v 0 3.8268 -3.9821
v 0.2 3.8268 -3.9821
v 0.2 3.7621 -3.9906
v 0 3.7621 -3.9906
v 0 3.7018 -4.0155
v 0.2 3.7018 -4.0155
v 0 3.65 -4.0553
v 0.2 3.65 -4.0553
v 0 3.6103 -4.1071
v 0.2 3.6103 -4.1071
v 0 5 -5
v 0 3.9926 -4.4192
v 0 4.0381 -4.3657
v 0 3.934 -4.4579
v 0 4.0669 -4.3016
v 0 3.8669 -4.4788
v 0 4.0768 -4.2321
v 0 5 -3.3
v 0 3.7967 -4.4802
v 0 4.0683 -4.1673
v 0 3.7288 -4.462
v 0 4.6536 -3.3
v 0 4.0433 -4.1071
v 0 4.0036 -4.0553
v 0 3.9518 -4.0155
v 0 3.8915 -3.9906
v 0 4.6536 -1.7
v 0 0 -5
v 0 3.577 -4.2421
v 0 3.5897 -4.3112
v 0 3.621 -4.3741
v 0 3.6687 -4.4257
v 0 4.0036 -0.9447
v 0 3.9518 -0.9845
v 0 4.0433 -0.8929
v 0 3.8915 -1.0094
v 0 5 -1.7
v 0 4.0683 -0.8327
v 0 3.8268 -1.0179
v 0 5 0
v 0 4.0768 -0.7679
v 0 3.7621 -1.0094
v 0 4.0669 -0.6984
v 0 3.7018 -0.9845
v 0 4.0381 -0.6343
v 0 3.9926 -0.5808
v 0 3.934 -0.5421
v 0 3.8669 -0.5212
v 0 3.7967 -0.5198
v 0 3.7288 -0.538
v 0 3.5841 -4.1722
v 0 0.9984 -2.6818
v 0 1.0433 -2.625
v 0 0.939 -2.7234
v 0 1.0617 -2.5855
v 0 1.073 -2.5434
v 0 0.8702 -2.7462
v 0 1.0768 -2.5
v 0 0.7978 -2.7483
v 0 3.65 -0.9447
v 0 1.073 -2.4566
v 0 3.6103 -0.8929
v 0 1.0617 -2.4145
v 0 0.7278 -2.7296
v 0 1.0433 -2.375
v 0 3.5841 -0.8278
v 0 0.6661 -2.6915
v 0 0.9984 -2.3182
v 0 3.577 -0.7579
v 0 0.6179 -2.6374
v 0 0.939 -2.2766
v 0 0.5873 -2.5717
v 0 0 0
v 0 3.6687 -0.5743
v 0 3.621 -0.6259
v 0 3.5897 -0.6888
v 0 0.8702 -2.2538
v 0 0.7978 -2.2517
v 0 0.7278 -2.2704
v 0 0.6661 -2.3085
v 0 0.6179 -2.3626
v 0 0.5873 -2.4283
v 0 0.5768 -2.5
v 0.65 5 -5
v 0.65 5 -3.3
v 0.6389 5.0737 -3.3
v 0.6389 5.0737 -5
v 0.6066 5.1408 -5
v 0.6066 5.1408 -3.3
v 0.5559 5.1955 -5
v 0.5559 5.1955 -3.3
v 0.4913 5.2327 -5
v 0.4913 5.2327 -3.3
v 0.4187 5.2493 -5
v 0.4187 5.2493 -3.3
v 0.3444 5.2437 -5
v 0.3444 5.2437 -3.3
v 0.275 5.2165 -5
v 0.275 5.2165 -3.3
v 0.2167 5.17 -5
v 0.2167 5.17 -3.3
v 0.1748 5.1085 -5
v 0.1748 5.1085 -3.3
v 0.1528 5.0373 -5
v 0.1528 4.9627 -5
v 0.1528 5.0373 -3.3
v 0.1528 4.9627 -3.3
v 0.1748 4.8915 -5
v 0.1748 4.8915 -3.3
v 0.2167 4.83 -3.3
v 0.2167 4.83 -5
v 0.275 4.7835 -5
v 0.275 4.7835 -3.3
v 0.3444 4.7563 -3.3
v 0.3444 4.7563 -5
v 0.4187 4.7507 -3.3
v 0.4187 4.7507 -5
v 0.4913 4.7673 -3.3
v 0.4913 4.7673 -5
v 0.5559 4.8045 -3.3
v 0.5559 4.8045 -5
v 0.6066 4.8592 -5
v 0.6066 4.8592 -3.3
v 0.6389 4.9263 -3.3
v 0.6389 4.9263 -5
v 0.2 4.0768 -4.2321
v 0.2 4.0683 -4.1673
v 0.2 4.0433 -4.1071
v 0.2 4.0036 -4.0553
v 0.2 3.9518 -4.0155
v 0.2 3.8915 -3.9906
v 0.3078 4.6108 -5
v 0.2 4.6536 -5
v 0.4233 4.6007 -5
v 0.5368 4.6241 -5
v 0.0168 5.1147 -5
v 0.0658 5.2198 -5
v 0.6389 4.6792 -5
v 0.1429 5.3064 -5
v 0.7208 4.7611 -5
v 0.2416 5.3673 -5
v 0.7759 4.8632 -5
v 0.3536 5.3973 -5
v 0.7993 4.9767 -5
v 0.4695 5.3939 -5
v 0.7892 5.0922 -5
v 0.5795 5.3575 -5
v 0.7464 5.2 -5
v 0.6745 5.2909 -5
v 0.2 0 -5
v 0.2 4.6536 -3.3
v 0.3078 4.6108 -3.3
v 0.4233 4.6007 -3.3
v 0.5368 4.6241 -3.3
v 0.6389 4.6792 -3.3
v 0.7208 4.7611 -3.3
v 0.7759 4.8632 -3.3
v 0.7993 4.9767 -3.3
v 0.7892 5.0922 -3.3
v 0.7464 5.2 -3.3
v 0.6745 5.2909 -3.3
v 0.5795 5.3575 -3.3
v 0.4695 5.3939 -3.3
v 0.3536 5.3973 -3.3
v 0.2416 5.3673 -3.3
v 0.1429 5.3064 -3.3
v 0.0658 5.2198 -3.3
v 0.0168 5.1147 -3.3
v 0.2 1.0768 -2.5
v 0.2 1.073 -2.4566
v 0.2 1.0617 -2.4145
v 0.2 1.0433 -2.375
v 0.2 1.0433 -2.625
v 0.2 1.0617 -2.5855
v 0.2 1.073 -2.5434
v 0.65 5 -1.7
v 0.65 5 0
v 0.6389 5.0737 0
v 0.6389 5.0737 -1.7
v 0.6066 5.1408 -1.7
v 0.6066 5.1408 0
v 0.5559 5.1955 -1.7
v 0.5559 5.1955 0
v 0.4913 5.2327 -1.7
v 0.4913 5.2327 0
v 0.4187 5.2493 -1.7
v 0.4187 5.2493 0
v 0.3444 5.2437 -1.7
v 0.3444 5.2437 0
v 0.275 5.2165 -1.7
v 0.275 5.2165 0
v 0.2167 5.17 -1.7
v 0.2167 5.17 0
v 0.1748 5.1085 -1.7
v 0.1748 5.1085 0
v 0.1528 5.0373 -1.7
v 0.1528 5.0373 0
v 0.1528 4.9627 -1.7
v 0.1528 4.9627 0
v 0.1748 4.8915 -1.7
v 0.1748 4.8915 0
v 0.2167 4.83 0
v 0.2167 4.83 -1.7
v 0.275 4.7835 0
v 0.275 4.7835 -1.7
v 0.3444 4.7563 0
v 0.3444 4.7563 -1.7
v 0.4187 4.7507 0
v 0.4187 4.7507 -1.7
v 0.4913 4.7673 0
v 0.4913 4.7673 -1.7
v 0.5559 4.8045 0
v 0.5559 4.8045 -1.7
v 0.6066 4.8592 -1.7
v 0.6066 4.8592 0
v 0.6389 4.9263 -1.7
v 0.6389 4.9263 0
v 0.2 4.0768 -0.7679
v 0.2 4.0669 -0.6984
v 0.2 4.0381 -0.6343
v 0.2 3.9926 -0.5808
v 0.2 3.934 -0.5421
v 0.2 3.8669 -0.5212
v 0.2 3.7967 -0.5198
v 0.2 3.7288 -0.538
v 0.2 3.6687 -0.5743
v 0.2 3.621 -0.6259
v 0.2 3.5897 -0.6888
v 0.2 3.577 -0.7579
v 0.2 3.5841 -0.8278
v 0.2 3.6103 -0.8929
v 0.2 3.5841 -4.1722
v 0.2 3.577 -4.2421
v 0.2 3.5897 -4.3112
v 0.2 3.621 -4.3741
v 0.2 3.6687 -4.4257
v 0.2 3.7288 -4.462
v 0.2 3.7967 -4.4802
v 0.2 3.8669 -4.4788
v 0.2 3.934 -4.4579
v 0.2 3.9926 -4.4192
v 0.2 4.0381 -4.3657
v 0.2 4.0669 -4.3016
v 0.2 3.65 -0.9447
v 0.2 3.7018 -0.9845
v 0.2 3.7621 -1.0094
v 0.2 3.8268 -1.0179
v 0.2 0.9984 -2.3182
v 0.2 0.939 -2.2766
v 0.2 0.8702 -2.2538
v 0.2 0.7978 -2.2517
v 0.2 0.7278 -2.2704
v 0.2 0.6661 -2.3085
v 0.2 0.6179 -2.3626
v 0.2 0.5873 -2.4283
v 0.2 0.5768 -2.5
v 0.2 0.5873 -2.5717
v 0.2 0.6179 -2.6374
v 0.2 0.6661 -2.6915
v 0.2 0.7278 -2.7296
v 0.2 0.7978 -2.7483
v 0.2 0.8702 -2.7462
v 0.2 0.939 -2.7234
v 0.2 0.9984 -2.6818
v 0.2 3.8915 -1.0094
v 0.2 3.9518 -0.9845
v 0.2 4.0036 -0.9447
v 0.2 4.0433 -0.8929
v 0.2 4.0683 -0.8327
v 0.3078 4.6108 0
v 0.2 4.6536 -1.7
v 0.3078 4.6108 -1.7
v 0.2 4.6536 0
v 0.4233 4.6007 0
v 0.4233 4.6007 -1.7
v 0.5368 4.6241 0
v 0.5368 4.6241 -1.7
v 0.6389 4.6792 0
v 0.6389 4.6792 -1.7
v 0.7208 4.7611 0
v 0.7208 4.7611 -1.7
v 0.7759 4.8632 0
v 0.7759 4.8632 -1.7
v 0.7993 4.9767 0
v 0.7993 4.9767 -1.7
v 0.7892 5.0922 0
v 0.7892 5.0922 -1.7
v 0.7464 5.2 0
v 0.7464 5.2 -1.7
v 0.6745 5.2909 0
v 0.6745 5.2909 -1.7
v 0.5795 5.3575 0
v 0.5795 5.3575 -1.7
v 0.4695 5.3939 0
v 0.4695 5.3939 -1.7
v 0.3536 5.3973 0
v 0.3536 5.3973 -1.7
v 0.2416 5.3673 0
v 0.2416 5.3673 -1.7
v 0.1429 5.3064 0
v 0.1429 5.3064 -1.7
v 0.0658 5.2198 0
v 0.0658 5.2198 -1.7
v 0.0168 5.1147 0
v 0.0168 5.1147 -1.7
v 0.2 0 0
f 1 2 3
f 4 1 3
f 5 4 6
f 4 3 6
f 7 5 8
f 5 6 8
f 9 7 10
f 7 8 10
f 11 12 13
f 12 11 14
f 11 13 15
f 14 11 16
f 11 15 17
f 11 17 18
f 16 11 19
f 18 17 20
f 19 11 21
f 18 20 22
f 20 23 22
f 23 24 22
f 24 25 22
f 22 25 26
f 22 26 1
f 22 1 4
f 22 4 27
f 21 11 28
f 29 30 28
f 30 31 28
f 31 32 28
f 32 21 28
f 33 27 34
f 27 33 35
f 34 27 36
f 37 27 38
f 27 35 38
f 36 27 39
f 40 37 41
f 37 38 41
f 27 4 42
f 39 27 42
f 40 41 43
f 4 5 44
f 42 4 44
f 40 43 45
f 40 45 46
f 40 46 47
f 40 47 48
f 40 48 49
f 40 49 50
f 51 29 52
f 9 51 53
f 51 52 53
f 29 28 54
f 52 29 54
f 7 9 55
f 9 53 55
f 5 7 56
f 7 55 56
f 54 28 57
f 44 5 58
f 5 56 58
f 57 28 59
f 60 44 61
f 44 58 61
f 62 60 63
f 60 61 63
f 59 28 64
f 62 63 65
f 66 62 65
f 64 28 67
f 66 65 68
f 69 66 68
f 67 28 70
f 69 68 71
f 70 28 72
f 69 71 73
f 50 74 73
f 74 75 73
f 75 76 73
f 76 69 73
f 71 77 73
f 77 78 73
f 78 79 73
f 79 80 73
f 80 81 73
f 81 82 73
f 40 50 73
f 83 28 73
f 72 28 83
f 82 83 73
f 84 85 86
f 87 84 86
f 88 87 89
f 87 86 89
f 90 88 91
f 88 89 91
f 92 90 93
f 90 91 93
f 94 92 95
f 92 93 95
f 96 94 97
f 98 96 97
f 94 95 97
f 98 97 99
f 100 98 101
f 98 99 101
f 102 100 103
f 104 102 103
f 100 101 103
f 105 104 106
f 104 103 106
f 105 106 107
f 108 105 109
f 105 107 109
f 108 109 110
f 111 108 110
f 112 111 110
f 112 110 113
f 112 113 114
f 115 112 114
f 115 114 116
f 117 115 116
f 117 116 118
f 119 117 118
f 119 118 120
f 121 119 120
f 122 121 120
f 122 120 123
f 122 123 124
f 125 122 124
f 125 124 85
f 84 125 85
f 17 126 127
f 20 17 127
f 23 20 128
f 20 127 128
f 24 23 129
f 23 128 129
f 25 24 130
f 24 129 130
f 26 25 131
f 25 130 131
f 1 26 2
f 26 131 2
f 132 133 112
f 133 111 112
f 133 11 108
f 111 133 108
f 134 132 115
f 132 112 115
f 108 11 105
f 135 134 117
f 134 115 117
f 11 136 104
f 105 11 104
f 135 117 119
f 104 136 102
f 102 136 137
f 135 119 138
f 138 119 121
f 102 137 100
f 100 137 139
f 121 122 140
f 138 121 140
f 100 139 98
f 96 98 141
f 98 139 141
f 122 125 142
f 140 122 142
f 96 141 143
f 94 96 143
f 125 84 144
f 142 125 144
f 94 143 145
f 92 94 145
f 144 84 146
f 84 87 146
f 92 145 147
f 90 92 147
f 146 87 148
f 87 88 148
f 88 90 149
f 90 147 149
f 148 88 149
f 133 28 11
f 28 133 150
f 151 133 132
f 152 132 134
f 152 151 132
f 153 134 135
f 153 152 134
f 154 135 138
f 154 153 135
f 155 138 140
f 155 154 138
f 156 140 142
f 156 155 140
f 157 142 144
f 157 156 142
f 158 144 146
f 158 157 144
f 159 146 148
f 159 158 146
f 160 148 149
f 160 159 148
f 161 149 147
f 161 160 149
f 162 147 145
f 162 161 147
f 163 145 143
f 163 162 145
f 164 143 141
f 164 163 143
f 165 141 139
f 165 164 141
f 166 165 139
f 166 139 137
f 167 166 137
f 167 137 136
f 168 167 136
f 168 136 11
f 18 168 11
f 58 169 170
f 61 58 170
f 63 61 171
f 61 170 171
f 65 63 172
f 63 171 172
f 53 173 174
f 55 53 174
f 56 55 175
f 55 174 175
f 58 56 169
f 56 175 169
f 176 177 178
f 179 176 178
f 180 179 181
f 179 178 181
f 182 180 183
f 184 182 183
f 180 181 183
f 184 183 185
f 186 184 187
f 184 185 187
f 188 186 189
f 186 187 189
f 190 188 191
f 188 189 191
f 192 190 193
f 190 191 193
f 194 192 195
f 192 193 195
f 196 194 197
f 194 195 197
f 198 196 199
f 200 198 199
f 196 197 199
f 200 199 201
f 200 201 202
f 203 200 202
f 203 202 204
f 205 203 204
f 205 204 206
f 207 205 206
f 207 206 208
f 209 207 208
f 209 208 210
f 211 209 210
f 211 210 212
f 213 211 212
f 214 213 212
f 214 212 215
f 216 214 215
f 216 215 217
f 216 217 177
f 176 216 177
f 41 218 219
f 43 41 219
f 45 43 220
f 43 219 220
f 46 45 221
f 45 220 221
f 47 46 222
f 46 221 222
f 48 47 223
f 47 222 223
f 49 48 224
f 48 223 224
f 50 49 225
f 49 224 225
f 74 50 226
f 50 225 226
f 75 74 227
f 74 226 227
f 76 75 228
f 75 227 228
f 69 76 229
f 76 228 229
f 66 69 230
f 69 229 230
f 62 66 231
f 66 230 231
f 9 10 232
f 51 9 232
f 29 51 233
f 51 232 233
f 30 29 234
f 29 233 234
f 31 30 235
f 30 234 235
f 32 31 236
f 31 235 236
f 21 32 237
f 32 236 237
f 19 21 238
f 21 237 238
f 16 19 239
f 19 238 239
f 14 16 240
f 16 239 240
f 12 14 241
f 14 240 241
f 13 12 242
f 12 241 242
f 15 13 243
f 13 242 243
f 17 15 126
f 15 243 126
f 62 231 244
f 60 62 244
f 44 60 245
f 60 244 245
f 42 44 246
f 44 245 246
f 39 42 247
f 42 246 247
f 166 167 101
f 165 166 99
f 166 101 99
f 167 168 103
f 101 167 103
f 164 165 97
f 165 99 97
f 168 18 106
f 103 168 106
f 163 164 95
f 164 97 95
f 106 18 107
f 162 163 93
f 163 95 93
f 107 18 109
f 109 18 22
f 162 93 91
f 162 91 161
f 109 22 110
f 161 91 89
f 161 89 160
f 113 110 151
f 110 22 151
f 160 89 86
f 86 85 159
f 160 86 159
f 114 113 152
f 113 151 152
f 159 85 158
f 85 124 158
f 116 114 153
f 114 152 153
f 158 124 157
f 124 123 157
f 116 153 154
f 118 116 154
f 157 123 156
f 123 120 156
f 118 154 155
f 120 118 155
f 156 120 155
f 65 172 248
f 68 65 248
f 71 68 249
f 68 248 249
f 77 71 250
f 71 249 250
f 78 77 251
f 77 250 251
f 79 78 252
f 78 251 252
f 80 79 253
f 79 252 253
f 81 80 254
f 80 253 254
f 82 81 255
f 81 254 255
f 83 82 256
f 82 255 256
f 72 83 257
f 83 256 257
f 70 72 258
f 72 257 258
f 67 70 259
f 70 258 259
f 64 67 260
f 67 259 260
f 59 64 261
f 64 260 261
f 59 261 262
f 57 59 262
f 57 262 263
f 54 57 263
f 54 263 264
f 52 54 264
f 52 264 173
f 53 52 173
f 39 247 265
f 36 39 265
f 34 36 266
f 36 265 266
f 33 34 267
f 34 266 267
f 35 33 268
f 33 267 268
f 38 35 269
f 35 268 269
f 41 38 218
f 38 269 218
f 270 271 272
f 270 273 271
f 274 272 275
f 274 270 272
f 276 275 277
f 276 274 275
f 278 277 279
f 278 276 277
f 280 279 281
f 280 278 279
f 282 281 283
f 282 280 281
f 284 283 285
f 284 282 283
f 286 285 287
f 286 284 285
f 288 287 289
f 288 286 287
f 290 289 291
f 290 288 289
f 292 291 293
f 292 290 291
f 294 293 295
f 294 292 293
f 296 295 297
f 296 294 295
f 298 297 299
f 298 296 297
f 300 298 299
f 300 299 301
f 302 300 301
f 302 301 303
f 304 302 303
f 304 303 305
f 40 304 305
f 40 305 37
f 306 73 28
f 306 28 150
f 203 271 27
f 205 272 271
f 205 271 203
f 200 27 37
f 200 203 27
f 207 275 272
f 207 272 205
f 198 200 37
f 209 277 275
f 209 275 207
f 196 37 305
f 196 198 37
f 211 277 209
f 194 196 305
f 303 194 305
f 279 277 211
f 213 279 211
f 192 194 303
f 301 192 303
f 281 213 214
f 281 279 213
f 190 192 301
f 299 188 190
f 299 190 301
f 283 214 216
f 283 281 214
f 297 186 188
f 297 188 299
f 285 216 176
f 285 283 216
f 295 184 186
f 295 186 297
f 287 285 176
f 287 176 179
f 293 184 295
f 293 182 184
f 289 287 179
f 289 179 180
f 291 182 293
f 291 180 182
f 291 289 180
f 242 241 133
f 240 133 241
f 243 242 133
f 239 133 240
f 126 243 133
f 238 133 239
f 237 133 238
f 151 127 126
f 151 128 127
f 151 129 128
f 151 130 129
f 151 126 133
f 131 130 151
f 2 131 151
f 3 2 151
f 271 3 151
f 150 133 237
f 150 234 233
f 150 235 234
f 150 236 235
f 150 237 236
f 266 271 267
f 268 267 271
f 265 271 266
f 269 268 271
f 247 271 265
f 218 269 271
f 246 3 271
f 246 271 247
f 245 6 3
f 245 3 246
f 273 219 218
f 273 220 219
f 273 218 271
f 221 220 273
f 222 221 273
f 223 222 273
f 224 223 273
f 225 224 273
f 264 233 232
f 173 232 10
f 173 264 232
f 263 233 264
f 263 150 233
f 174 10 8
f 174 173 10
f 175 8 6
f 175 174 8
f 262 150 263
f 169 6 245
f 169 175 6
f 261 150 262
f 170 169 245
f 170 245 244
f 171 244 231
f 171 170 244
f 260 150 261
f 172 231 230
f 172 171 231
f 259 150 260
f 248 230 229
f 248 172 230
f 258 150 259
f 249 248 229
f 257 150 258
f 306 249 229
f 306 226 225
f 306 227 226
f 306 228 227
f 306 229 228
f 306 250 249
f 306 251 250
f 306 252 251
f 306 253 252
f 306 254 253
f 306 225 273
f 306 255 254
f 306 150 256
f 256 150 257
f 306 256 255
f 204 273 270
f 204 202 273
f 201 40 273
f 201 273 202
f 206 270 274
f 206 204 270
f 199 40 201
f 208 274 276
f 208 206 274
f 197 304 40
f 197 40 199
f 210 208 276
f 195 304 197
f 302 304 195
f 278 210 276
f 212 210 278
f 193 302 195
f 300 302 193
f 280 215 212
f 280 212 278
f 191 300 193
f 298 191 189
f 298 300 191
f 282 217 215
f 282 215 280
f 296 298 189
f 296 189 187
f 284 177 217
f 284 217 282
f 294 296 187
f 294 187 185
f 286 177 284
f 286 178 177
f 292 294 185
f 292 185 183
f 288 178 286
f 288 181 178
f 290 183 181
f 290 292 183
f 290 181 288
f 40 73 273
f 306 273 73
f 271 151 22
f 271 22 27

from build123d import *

# Parameters (mm, degrees)
F0_W      = 0.2
F0_H      = 5
F1_DEPTH  = 5
F2_R      = 0.4
F3_DEPTH  = 5
F4_R      = 0.25
F5_DEPTH  = 5.001
F6_W      = 0.733872
F6_H      = 0.8
F7_DEPTH  = 5.401
F8_W      = 1.051865
F8_H      = 1.6
F9_DEPTH  = 0.201
F11_DEPTH = 0.201


with BuildPart() as f1:
    # F0 (on Front) → F1 (new body)
    with BuildSketch(Plane.XZ):
        with Locations((0.1, -2.5)):
            Rectangle(F0_W, F0_H)
    extrude(amount=-F1_DEPTH)

    # F2 (on face) → F3 (join)
    with BuildSketch(Plane.XY):
        with Locations((0.4, 5)):
            Circle(F2_R)
    extrude(amount=-F3_DEPTH)

    # F4 (on face) → F5 (cut, through all)
    with BuildSketch(Plane.XY):
        with Locations((0.4, 5)):
            Circle(F4_R)
    extrude(amount=-F5_DEPTH, mode=Mode.SUBTRACT)

    # F6 (on face) → F7 (cut, through all)
    with BuildSketch(Plane.XZ):
        with Locations((0.566936, -2.1)):
            Rectangle(F6_W, F6_H)
        with Locations((0.566936, -2.9)):
            Rectangle(F6_W, F6_H)
    extrude(amount=-F7_DEPTH, mode=Mode.SUBTRACT)

    # F8 (on face) → F9 (cut, through all)
    with BuildSketch(Plane.YZ.offset(0.2)):
        with Locations((5.179522, -2.5)):
            Rectangle(F8_W, F8_H)
    extrude(amount=-F9_DEPTH, mode=Mode.SUBTRACT)

    # F10 (on face) → F11 (cut, through all)
    with BuildSketch(Plane.YZ.offset(0.2)):
        with BuildLine():
            Line((3.826795, -1.017949), (3.826795, -0.767949))
            Line((3.826795, -0.767949), (3.610289, -0.892949))
            ThreePointArc((3.610289, -0.892949), (3.701795, -0.984456), (3.826795, -1.017949))
        make_face()
        with BuildLine():
            Line((3.610289, -0.892949), (3.826795, -0.767949))
            Line((3.826795, -0.767949), (3.826795, -1.017949))
            ThreePointArc((3.826795, -1.017949), (4.003572, -0.944726), (4.076795, -0.767949))
            ThreePointArc((4.076795, -0.767949), (3.76209, -0.526468), (3.610289, -0.892949))
        make_face()
        with BuildLine():
            Line((3.826795, -4.232051), (3.826795, -3.982051))
            ThreePointArc((3.826795, -3.982051), (3.701795, -4.015544), (3.610289, -4.107051))
            Line((3.610289, -4.107051), (3.826795, -4.232051))
        make_face()
        with BuildLine():
            ThreePointArc((4.076795, -4.232051), (4.003572, -4.055274), (3.826795, -3.982051))
            Line((3.826795, -3.982051), (3.826795, -4.232051))
            Line((3.826795, -4.232051), (3.610289, -4.107051))
            ThreePointArc((3.610289, -4.107051), (3.76209, -4.473532), (4.076795, -4.232051))
        make_face()
        with BuildLine():
            Line((0.826795, -2.5), (1.043301, -2.375))
            ThreePointArc((1.043301, -2.375), (0.576795, -2.5), (1.043301, -2.625))
            Line((1.043301, -2.625), (0.826795, -2.5))
        make_face()
        with BuildLine():
            ThreePointArc((1.076795, -2.5), (1.068276, -2.435295), (1.043301, -2.375))
            Line((1.043301, -2.375), (0.826795, -2.5))
            Line((0.826795, -2.5), (1.043301, -2.625))
            ThreePointArc((1.043301, -2.625), (1.068276, -2.564705), (1.076795, -2.5))
        make_face()
    extrude(amount=-F11_DEPTH, mode=Mode.SUBTRACT)


solid = f1.part
